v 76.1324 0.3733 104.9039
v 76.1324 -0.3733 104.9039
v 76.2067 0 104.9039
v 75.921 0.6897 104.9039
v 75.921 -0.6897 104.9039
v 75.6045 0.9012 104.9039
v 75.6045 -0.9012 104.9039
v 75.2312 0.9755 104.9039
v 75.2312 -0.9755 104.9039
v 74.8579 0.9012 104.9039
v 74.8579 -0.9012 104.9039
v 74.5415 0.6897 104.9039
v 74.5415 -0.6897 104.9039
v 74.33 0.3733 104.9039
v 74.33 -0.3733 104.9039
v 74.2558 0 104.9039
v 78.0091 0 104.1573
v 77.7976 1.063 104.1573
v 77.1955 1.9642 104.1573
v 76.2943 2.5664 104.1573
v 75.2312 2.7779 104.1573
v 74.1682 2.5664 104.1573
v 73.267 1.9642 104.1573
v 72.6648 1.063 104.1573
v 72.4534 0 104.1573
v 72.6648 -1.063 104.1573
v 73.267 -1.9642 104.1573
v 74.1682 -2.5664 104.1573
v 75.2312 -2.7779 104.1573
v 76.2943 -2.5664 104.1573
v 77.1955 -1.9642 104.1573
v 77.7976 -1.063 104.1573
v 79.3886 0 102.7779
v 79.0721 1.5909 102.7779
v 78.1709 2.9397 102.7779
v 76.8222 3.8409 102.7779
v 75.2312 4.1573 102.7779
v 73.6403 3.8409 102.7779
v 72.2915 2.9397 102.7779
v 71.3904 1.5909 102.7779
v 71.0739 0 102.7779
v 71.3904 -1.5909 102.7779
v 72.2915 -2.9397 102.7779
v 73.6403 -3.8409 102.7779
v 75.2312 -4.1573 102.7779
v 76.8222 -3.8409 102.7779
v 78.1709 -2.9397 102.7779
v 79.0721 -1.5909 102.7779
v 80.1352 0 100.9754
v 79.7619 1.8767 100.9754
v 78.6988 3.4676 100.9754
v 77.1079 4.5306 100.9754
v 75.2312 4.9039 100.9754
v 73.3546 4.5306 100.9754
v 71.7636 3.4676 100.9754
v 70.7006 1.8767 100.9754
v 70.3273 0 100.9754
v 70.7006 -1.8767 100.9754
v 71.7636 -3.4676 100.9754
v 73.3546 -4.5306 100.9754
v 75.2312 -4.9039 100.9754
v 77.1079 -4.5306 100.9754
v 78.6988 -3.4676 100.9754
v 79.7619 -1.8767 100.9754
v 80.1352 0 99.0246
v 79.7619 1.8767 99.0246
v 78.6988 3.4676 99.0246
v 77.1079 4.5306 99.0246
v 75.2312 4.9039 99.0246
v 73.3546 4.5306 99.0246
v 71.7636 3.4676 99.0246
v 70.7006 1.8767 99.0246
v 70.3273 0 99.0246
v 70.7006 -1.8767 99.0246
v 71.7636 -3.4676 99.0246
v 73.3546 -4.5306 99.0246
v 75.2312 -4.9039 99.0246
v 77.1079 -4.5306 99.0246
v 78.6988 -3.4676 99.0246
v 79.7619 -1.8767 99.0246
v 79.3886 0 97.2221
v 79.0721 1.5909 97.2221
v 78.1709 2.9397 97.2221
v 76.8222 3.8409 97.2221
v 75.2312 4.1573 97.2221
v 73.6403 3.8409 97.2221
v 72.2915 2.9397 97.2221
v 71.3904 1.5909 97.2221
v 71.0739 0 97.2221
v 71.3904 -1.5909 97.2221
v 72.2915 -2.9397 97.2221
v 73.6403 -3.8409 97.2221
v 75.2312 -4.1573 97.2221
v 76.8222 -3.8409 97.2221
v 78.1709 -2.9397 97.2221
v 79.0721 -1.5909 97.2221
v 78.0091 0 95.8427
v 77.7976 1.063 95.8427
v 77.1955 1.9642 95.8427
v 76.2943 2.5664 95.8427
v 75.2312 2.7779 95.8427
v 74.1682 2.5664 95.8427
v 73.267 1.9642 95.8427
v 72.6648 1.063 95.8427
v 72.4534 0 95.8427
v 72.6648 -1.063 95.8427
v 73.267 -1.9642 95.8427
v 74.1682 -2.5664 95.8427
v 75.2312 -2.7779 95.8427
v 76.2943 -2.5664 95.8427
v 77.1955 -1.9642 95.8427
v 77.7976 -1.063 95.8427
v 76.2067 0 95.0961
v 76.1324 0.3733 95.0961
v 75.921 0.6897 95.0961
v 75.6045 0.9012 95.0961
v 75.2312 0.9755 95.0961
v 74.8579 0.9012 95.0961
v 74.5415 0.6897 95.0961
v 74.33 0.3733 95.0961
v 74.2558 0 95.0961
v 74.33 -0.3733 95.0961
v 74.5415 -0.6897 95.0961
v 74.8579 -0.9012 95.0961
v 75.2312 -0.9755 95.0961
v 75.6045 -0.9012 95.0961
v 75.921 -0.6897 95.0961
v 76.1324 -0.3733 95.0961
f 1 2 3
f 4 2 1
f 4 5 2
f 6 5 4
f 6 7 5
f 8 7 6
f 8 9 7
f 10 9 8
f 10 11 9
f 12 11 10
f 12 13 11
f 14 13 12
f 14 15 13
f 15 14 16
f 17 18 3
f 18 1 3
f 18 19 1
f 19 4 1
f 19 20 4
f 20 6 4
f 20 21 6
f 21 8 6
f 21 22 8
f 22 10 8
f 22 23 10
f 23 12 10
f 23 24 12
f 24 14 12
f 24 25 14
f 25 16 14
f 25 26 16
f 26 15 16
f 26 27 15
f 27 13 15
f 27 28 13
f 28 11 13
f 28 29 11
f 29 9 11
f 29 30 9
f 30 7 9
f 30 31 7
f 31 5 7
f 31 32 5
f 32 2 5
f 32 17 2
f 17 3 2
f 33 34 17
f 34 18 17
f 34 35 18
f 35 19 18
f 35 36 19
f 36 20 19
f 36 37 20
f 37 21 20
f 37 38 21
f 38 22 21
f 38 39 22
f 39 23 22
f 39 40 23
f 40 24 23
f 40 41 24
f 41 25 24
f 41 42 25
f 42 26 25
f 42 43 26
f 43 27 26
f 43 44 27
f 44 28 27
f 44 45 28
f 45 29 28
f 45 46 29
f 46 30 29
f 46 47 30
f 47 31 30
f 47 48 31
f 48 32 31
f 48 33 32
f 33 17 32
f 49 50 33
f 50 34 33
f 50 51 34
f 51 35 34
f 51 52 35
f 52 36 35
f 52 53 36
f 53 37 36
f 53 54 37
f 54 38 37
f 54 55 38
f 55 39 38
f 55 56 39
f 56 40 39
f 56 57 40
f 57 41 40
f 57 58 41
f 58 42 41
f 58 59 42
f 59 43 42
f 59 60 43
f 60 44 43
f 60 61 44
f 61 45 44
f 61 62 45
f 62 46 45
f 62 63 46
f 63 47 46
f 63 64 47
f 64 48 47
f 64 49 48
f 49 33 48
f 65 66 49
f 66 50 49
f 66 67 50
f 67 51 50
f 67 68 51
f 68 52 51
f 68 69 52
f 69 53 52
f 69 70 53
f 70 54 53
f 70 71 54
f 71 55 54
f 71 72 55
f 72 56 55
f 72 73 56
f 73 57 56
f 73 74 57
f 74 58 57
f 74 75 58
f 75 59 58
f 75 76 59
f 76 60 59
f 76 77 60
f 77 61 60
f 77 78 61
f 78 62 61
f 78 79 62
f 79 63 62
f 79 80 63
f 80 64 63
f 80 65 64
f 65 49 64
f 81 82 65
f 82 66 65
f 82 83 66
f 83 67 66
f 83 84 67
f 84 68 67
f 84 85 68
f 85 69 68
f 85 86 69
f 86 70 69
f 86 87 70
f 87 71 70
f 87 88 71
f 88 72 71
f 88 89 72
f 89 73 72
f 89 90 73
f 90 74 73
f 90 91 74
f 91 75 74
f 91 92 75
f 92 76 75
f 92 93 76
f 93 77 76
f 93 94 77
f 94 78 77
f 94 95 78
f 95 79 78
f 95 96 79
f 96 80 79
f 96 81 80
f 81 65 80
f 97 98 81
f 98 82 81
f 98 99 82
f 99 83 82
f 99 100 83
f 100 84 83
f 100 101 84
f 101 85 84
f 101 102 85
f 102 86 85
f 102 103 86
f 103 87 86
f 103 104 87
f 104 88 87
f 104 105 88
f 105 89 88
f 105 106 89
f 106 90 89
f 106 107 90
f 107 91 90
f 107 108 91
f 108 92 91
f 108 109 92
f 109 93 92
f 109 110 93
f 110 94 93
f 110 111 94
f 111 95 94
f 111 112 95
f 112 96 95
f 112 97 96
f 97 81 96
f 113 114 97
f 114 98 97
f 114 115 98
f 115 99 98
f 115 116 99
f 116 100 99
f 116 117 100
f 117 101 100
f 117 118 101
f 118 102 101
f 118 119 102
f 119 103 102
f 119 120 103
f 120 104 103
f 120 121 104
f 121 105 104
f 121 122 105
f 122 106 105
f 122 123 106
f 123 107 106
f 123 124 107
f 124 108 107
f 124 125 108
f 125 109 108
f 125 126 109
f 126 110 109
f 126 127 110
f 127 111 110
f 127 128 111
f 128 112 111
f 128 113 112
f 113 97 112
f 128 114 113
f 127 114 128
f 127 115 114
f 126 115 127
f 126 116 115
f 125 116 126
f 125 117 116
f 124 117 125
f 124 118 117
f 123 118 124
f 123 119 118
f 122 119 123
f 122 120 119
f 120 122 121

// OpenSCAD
include <winged_helmet_v20.scad>
part = "none"; build = "full";
which = 0;
DF = dome_fullness;
function z_of_r(r) = HI * pow(1 - pow(min(1, max(0, r) / RI), DF), 1 / DF);
function top_z(y) = z_of_r(abs(y) / K - W) + W;                    // shell outer height at x = 0
function side_pt(th, z) = surf_pt(th, z);
M = [
  [1, [a_out(100), 0, 100]],                                        // shell seam (right)
  [1, [-a_out(100), 0, 100]],                                       // shell seam (left)
  [2, [a_out(38) + 14, 14, 38]],                                    // wing mount block (right)
  [3, side_pt(95, bb(95) - 3)],                                     // cheek guard snap tongue (right)
  [4, side_pt(180, bb(180) - 3)],                                   // neck plate snap tongue
  [5, side_pt(240, -75)],                                           // cheek guard / neck plate pin (left)
  [6, [0, y_shell(62) - 16, 62]],                                   // front H pegs
  [7, surf_pt(th_back_of(-72, 36), -72)],                           // cheek H pegs (right)
  [8, [0, -70, top_z(-70) + 6]],                                    // crest pegs (front)
  [8, [0, 90, top_z(90) + 6]],                                      // crest pegs (back)
];
for (i = [0:len(M) - 1]) if (i == which) color("red") translate(M[i][1]) sphere(r = 5, $fn = 16);
